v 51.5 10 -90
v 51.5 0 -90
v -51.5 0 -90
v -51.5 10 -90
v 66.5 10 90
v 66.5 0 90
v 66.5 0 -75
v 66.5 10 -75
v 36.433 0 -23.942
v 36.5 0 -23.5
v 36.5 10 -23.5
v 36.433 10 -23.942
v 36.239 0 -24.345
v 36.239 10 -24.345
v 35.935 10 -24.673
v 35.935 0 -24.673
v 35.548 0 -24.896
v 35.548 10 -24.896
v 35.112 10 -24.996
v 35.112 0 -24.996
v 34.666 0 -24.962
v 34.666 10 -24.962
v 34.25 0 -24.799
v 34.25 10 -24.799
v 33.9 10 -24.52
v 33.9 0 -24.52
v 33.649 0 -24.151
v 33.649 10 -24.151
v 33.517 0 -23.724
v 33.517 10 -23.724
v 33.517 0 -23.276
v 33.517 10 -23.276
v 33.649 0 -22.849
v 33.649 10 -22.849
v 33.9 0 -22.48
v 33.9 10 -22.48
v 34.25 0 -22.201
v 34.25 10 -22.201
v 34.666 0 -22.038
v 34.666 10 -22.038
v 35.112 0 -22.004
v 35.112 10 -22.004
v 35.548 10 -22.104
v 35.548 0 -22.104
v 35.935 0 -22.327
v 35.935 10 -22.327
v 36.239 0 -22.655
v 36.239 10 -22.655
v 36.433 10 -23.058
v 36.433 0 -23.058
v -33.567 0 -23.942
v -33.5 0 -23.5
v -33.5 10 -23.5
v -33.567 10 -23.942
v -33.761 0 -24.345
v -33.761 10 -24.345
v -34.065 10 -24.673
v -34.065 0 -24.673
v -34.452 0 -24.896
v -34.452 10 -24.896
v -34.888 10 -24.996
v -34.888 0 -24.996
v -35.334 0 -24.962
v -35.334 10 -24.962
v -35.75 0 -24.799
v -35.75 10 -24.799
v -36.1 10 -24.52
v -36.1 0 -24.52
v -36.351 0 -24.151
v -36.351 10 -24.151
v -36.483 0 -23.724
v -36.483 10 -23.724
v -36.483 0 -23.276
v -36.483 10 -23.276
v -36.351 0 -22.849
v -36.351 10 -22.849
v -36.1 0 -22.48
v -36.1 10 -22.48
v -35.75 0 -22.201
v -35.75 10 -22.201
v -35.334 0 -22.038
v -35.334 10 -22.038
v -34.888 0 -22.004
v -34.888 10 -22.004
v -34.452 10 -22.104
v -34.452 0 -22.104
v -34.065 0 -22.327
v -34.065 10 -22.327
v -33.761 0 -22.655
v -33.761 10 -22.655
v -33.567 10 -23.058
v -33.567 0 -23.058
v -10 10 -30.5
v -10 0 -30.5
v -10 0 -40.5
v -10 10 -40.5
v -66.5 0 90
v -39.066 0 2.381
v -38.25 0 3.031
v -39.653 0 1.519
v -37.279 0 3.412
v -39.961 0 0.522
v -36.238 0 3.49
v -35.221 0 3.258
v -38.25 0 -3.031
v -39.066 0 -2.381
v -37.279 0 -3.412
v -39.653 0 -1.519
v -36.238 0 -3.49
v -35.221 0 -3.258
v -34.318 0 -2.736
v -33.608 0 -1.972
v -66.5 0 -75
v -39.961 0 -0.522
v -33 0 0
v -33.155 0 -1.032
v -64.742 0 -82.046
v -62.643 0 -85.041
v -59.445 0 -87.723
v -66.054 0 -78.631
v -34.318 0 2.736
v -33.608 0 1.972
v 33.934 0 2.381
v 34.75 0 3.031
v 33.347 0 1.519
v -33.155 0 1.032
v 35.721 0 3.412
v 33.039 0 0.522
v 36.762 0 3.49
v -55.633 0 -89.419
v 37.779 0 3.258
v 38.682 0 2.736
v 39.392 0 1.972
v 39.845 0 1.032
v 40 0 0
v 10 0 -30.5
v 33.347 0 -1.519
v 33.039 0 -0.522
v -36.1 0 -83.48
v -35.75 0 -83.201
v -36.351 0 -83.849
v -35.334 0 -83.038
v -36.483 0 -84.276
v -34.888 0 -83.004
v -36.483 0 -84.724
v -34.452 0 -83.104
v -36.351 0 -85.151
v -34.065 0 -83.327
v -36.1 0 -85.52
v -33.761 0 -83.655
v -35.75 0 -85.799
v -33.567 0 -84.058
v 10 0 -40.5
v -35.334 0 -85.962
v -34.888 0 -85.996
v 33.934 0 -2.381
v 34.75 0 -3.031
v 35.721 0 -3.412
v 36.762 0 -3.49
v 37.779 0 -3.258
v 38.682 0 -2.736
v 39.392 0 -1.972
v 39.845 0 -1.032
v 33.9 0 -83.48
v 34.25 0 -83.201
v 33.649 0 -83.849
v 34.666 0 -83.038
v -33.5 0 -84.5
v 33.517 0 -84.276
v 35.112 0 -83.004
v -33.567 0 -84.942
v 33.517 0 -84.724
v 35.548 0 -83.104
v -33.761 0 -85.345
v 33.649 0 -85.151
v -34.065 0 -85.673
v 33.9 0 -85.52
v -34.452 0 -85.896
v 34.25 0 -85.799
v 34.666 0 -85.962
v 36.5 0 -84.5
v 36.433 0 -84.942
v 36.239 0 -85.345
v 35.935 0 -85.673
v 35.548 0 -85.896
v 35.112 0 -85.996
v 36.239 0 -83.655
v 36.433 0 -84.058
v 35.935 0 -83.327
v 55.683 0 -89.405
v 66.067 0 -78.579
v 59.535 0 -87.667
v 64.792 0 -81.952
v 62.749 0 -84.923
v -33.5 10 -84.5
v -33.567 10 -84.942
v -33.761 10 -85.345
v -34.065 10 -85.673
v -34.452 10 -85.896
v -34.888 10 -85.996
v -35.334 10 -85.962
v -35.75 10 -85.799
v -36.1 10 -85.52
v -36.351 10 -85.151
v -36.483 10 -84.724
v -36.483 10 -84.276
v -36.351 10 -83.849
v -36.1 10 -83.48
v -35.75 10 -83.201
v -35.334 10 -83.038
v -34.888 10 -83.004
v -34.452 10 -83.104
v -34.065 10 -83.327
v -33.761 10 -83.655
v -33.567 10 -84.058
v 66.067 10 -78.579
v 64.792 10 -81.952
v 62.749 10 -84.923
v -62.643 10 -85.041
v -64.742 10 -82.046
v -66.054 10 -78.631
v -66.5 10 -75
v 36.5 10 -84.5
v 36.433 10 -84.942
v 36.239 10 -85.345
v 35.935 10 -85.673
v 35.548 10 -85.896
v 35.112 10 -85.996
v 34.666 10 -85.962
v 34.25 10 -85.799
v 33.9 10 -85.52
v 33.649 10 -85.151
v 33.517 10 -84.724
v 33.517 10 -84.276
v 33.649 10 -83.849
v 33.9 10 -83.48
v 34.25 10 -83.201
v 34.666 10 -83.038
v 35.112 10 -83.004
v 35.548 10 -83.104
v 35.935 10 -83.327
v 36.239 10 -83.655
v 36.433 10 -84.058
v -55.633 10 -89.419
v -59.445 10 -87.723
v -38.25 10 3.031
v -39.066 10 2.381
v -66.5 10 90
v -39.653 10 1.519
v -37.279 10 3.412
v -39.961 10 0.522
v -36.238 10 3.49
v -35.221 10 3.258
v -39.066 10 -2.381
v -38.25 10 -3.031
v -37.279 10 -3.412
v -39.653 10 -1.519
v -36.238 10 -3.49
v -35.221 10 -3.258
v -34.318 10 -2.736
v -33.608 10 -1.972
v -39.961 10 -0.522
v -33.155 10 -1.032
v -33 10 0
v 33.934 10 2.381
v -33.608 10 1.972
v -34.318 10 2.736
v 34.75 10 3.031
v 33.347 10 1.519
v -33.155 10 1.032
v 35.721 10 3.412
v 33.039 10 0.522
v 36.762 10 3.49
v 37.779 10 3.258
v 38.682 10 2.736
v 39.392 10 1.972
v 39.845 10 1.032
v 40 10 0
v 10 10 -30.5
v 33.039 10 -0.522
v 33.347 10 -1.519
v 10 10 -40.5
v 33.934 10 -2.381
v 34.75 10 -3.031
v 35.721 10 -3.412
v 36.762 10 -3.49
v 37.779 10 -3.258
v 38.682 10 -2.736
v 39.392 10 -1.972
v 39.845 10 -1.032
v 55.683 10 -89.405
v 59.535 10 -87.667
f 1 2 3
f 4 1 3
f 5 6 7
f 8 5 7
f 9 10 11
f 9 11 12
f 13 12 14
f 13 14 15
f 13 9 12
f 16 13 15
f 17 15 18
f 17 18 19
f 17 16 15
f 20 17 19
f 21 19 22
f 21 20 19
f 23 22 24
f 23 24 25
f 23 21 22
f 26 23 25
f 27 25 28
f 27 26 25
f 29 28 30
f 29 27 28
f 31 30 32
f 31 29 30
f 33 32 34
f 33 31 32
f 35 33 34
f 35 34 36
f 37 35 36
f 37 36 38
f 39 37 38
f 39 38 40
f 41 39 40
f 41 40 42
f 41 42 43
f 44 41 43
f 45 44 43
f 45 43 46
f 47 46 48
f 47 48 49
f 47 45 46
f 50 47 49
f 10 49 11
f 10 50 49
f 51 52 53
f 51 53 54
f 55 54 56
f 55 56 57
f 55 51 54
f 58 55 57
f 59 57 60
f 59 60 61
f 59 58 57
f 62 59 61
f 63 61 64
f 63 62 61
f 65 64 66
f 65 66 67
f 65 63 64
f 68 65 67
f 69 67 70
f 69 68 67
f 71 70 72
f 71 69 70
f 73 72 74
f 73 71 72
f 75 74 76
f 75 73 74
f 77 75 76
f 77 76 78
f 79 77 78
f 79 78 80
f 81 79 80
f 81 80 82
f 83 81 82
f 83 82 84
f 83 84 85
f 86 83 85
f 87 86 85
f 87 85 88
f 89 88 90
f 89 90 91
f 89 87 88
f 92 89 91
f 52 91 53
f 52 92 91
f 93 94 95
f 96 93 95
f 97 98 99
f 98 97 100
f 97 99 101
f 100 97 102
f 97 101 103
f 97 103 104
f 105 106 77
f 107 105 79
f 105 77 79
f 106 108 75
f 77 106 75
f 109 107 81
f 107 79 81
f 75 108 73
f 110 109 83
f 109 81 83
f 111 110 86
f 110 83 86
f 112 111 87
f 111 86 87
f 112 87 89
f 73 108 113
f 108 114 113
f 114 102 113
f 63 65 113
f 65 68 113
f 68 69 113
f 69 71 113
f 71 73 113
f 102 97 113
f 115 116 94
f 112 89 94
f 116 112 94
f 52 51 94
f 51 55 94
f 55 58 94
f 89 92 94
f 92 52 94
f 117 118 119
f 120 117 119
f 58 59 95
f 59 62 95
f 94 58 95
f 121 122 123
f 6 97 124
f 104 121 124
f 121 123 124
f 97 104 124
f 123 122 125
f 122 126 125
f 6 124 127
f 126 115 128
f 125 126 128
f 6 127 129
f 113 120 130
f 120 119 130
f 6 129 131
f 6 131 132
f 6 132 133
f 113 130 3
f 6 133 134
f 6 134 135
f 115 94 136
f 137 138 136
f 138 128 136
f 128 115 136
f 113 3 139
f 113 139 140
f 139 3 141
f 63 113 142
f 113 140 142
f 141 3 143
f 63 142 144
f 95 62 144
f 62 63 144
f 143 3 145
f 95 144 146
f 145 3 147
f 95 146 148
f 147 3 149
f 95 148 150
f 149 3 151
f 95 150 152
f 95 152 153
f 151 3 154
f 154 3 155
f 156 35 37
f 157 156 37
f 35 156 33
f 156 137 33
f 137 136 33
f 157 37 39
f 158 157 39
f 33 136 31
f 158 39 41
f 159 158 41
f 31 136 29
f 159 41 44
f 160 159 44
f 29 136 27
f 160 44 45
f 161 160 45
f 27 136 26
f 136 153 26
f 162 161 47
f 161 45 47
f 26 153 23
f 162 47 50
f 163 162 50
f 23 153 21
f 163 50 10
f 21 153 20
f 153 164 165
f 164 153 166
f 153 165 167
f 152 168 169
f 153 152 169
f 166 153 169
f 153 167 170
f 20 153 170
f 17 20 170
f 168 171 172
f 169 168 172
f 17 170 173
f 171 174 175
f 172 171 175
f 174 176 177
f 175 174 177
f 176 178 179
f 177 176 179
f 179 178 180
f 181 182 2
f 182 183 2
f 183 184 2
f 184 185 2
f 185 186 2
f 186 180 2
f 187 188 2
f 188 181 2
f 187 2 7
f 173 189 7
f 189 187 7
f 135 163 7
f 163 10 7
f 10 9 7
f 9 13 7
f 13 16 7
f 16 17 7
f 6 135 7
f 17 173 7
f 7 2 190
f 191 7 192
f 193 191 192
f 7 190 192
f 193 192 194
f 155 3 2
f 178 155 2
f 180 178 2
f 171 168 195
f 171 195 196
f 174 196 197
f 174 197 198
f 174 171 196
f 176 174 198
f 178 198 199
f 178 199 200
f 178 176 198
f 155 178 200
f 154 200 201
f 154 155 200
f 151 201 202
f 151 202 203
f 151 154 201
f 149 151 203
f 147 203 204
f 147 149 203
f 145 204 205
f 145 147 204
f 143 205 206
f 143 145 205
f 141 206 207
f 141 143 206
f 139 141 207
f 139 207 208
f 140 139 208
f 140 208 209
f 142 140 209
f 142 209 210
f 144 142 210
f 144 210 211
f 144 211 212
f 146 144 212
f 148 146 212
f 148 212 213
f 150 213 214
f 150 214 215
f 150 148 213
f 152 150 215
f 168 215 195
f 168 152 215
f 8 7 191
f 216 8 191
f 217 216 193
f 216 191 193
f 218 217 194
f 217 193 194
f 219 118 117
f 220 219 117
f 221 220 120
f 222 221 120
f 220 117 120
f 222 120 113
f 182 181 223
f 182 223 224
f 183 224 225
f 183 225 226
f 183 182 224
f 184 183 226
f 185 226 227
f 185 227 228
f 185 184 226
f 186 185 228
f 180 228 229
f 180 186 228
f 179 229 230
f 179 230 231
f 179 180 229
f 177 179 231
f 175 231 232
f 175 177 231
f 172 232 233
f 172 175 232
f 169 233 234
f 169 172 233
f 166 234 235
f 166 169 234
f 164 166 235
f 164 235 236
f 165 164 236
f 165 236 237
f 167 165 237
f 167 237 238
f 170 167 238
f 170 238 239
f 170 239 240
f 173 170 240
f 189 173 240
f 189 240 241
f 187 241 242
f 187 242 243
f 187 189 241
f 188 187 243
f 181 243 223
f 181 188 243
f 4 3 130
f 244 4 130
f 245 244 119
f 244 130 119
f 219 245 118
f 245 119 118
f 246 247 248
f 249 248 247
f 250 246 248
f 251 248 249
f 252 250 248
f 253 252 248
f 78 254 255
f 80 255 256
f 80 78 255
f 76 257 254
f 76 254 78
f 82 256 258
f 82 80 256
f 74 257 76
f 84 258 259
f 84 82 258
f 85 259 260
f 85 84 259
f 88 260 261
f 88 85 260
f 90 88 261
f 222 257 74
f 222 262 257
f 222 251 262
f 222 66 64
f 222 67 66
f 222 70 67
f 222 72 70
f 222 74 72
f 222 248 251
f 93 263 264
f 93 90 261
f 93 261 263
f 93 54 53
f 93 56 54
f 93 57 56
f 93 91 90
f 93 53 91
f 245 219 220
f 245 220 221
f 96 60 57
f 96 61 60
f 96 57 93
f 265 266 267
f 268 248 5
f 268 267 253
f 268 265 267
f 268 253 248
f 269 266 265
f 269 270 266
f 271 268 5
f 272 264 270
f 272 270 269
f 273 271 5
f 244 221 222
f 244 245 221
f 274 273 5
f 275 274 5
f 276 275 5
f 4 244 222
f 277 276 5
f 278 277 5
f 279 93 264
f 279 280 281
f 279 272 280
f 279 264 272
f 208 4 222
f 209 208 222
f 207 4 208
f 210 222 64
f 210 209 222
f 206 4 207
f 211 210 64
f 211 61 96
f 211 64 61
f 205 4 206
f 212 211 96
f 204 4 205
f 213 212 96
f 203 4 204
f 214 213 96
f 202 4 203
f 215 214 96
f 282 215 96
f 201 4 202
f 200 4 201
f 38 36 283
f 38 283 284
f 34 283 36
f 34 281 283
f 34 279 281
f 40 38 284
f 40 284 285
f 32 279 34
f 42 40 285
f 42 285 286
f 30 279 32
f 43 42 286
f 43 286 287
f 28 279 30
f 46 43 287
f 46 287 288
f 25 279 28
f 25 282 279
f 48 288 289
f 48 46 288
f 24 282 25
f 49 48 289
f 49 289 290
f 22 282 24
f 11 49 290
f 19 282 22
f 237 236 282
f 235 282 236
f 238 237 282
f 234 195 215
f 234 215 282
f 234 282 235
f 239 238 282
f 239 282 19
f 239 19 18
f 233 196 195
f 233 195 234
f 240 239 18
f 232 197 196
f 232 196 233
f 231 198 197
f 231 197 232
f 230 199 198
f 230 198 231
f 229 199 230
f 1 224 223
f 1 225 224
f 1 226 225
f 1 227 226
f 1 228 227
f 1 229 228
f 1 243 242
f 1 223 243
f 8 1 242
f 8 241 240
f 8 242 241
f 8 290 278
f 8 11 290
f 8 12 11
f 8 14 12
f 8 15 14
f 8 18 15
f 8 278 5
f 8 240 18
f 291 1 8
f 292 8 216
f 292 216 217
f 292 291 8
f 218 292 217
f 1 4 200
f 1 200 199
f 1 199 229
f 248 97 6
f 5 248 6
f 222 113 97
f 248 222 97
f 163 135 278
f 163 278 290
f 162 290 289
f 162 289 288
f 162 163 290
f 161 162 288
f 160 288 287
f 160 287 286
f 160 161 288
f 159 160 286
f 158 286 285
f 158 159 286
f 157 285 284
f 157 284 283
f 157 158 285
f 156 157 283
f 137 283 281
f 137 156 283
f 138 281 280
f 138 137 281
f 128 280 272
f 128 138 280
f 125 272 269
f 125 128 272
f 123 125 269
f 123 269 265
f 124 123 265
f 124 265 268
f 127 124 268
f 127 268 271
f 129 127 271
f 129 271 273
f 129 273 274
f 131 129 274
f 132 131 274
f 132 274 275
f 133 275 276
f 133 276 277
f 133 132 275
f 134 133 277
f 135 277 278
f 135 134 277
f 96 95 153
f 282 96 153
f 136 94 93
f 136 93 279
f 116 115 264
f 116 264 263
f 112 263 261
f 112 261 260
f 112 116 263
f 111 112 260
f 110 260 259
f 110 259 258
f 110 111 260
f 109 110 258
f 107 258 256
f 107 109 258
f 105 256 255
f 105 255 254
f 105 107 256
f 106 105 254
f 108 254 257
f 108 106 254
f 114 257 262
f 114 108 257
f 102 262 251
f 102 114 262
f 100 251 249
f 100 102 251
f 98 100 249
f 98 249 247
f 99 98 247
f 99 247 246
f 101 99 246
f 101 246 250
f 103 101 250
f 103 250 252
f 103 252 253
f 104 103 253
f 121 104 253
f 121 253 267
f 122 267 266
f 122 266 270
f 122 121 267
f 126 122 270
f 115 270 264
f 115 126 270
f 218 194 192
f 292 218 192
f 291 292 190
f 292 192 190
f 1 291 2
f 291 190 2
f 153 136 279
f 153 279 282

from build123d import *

# Parameters (mm, degrees)
SKETCH1_R           = 3.5
SKETCH1_R_2         = 1.5
SKETCH1_W           = 20
SKETCH1_H           = 10
BOSS_EXTRUDE1_DEPTH = 10


with BuildPart() as part:
    # Sketch1 → Boss-Extrude1 (new body)
    with BuildSketch(Plane(origin=(0, 0, 0), x_dir=(1, 0, 0), z_dir=(0, 1, 0))):
        Polygon((0.049612108, 0.067144207), (-66.5, -90), (66.5, -90), align=None)
        with BuildLine():
            Line((-66.5, 75), (-66.5, -90))
            Line((-66.5, -90), (0.049612108, 0.067144207))
            Line((0.049612108, 0.067144207), (-62.643246745, 85.041317243))
            ThreePointArc((-62.643246745, 85.041317243), (-65.502655126, 80.378257098), (-66.5, 75))
        make_face()
        with Locations((-36.5, 0)):
            Circle(SKETCH1_R, mode=Mode.SUBTRACT)
        with Locations((-35, 23.5)):
            Circle(SKETCH1_R_2, mode=Mode.SUBTRACT)
        with BuildLine():
            Line((62.748695437, 84.923046456), (0.049612108, 0.067144207))
            Line((0.049612108, 0.067144207), (66.5, -90))
            Line((66.5, -90), (66.5, 75))
            ThreePointArc((66.5, 75), (65.530866537, 80.304223244), (62.748695437, 84.923046456))
        make_face()
        with Locations((36.5, 0)):
            Circle(SKETCH1_R, mode=Mode.SUBTRACT)
        with Locations((35, 23.5)):
            Circle(SKETCH1_R_2, mode=Mode.SUBTRACT)
        with BuildLine():
            Line((-62.643246745, 85.041317243), (0.049612108, 0.067144207))
            Line((0.049612108, 0.067144207), (62.748695437, 84.923046456))
            ThreePointArc((62.748695437, 84.923046456), (57.670668649, 88.671973099), (51.5, 90))
            Line((51.5, 90), (-51.5, 90))
            ThreePointArc((-51.5, 90), (-57.598370329, 88.704374459), (-62.643246745, 85.041317243))
        make_face()
        with Locations((-35, 84.5)):
            Circle(SKETCH1_R_2, mode=Mode.SUBTRACT)
        with Locations((0, 35.5)):
            Rectangle(SKETCH1_W, SKETCH1_H, mode=Mode.SUBTRACT)
        with Locations((35, 84.5)):
            Circle(SKETCH1_R_2, mode=Mode.SUBTRACT)
    extrude(amount=BOSS_EXTRUDE1_DEPTH)


solid = part.part
